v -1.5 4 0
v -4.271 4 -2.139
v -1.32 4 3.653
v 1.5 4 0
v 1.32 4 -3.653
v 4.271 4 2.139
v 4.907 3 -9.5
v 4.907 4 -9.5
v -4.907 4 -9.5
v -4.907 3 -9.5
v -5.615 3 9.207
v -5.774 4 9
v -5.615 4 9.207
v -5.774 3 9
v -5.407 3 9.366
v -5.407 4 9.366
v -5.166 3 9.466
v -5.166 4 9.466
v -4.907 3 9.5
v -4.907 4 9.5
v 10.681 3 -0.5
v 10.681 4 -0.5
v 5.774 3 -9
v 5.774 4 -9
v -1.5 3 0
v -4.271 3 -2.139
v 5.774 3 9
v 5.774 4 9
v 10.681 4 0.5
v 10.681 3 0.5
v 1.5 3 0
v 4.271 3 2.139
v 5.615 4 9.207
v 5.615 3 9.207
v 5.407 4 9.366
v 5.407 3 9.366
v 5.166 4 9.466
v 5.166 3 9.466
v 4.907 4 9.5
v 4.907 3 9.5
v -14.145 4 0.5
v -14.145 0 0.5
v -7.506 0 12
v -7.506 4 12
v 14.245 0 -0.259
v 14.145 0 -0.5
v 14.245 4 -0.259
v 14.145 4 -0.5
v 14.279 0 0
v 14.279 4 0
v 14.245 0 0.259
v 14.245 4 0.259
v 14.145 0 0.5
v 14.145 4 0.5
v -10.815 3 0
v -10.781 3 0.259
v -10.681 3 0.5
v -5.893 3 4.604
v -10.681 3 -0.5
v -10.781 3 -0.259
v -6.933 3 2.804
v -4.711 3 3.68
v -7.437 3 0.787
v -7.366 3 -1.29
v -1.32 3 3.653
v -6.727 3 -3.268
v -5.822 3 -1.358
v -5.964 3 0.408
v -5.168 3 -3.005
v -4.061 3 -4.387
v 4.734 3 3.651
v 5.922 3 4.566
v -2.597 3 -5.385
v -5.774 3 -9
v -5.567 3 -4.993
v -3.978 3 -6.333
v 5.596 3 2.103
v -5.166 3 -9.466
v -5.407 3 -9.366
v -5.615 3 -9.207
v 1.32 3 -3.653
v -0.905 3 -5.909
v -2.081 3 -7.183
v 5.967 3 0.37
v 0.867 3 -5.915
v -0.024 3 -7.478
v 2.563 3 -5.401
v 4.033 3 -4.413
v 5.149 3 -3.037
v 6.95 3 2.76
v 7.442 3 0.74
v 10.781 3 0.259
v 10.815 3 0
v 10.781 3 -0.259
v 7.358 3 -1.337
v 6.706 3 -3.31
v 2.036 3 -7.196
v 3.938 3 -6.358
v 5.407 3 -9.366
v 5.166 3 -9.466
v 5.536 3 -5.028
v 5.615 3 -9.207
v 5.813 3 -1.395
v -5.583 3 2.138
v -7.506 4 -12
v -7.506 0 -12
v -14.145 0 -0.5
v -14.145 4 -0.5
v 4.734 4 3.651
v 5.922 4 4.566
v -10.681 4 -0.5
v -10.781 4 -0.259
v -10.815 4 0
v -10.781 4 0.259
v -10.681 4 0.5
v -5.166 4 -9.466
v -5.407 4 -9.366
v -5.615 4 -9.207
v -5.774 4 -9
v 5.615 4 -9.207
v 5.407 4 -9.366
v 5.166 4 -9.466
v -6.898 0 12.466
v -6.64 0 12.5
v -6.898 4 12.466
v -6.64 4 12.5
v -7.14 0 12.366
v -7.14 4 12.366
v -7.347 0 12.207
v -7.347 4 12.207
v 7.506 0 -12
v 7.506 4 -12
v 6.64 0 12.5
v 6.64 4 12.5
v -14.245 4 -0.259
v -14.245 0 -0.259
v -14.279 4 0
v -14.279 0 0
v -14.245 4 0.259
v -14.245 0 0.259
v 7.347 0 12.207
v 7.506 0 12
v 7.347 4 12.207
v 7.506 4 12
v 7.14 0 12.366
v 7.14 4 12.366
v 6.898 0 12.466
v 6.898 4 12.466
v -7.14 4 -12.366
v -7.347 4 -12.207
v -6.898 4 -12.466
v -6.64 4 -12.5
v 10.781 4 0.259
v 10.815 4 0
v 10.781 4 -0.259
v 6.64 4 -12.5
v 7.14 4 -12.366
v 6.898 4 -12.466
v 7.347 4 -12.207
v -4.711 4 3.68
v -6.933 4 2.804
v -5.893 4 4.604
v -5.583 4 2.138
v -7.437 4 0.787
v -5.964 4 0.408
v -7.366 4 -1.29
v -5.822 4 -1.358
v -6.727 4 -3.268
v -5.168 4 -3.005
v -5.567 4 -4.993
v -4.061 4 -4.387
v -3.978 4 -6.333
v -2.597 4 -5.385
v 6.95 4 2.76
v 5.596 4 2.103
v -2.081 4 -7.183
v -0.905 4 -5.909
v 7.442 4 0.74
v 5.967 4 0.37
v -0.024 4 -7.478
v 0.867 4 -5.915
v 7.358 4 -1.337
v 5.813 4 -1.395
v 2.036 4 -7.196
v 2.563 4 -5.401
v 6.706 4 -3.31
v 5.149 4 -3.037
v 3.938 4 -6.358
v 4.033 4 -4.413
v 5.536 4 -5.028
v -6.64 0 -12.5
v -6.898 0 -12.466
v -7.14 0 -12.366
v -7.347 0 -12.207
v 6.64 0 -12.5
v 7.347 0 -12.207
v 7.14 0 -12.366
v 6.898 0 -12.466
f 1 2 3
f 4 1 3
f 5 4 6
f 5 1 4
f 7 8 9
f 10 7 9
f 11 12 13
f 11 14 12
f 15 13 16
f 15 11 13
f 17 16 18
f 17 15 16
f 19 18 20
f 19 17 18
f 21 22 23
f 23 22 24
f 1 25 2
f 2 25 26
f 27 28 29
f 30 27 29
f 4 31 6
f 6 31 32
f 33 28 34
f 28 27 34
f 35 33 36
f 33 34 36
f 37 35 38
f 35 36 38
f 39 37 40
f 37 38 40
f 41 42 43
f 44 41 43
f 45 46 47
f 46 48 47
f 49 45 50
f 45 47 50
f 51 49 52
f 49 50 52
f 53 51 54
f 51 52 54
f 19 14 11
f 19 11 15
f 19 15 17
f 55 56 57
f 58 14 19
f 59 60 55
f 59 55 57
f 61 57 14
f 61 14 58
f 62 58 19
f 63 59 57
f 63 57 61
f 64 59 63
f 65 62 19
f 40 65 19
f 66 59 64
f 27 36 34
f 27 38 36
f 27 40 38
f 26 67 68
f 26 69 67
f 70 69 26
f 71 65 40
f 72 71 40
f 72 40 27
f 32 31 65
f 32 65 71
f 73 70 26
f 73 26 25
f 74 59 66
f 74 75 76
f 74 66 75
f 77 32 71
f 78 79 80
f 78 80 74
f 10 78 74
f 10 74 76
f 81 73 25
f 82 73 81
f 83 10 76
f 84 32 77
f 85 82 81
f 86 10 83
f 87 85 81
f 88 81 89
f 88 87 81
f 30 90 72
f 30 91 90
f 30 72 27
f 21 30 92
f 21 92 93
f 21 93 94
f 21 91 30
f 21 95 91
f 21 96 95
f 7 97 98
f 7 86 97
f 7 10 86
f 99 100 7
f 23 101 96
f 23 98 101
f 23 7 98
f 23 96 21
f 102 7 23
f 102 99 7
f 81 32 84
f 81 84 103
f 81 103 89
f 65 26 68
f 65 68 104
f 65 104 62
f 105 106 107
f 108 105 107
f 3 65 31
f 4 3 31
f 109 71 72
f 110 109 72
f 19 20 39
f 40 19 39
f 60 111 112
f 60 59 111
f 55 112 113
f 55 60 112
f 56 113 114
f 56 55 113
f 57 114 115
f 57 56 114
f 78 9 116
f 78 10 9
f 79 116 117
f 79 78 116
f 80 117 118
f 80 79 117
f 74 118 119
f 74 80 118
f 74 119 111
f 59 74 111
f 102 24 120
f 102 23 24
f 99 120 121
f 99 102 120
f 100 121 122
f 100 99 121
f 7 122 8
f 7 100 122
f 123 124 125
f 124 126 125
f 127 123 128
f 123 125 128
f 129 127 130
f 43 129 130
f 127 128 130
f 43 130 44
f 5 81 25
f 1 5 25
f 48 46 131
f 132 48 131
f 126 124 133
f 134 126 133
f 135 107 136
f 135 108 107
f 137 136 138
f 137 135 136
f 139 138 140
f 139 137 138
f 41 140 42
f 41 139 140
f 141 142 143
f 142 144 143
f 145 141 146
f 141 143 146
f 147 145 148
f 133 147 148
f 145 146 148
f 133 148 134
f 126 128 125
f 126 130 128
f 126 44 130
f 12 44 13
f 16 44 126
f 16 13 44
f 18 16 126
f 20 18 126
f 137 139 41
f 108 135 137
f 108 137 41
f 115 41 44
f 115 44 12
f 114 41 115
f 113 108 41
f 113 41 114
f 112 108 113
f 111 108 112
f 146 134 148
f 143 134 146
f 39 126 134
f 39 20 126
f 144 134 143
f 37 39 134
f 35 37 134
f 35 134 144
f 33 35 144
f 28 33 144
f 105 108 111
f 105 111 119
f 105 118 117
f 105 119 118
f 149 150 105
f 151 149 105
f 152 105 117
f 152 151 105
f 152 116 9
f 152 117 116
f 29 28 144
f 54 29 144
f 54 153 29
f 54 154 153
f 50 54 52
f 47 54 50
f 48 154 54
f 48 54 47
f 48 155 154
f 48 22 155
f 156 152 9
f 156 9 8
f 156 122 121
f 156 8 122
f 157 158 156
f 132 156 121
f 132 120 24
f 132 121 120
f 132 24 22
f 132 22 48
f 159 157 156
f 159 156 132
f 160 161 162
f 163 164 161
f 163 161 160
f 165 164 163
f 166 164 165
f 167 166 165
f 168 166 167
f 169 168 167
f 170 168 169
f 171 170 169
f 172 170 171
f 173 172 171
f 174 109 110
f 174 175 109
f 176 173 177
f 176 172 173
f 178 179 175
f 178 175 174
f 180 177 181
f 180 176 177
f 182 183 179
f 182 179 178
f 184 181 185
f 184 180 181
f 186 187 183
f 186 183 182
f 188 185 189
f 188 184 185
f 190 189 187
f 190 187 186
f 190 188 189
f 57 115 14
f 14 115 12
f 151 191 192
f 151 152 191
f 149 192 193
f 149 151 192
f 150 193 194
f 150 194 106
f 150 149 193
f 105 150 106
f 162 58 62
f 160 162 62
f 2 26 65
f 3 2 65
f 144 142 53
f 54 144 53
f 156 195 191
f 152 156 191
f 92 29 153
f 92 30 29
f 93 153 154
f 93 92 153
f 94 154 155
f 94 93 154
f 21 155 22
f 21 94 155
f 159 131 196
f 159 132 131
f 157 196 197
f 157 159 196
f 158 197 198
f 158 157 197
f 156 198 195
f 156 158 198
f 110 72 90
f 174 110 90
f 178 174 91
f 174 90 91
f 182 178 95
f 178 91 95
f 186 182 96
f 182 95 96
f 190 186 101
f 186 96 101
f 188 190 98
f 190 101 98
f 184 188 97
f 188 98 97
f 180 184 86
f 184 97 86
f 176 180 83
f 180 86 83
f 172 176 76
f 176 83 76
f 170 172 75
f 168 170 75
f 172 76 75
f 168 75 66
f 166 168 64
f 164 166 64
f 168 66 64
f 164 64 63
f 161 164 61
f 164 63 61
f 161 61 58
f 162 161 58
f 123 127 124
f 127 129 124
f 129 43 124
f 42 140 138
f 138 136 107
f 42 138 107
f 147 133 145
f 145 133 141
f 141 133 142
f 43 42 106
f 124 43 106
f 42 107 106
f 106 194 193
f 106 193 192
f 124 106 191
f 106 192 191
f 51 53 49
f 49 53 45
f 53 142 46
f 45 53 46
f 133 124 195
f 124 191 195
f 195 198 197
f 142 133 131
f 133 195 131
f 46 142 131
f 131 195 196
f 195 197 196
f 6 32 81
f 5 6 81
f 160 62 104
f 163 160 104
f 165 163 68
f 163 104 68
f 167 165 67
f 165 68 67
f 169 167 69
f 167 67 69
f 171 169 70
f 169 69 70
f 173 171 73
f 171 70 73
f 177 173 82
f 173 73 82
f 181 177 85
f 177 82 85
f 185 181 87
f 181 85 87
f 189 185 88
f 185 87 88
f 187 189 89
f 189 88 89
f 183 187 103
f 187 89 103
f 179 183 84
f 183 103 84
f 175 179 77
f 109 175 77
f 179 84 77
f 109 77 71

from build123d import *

# Parameters (mm, degrees)
EXTRUDE_1_DEPTH     = 4
CUT_EXTRUDE_1_DEPTH = 1
FILLET_1_R          = 1
EXTRUDE_2_DEPTH     = 1


with BuildPart() as part:
    # 草图1 → 凸台-拉伸1 (new body)
    with BuildSketch(Plane(origin=(0, 0, 0), x_dir=(1, 0, 0), z_dir=(0, 1, 0))):
        Polygon((14.43375673, 0), (7.216878365, 12.5), (-7.216878365, 12.5), (-14.43375673, 0), (-7.216878365, -12.5), (7.216878365, -12.5), align=None)
    extrude(amount=EXTRUDE_1_DEPTH)

    # 草图2 → 切除-拉伸1 (cut)
    with BuildSketch(Plane(origin=(0, 4, 0), x_dir=(1, 0, 0), z_dir=(0, 1, 0))):
        Polygon((5.484827557, -9.5), (10.969655115, 0), (5.484827557, 9.5), (-5.484827557, 9.5), (-10.969655115, 0), (-5.484827557, -9.5), align=None)
    extrude(amount=-CUT_EXTRUDE_1_DEPTH, mode=Mode.SUBTRACT)

    # 圆角1
    fillet_1_edges = [part.edges().sort_by_distance(p)[0] for p in [
        (7.216878365, 2, 12.5),
        (-7.216878365, 2, 12.5),
        (-14.43375673, 2, 0),
        (-7.216878365, 2, -12.5),
        (7.216878365, 2, -12.5),
        (14.43375673, 2, 0),
        (5.484827557, 3.5, 9.5),
        (-5.484827557, 3.5, 9.5),
        (-10.969655115, 3.5, 0),
        (-5.484827557, 3.5, -9.5),
        (5.484827557, 3.5, -9.5),
        (10.969655115, 3.5, 0),
    ]]
    fillet(fillet_1_edges, radius=FILLET_1_R)

    # 草图3 → 凸台-拉伸2 (add)
    with BuildSketch(Plane(origin=(0, 3, 0), x_dir=(1, 0, 0), z_dir=(0, 1, 0))):
        Polygon((4.270525574, -2.13873515), (1.319973126, 3.653003816), (-1.5, 0), (-4.270525574, 2.13873515), (-1.319973126, -3.653003816), (1.5, 0), align=None)
        with BuildLine():
            Line((4.73426289, -3.650545759), (5.922130387, -4.566499256))
            ThreePointArc((5.922130387, -4.566499256), (-0.023704107, 7.478233875), (-5.893062385, -4.603950425))
            Line((-5.893062385, -4.603950425), (-4.71102538, -3.68048493))
            ThreePointArc((-4.71102538, -3.68048493), (-0.018949511, 5.978241411), (4.73426289, -3.650545759))
        make_face()
    extrude(amount=EXTRUDE_2_DEPTH)


solid = part.part
